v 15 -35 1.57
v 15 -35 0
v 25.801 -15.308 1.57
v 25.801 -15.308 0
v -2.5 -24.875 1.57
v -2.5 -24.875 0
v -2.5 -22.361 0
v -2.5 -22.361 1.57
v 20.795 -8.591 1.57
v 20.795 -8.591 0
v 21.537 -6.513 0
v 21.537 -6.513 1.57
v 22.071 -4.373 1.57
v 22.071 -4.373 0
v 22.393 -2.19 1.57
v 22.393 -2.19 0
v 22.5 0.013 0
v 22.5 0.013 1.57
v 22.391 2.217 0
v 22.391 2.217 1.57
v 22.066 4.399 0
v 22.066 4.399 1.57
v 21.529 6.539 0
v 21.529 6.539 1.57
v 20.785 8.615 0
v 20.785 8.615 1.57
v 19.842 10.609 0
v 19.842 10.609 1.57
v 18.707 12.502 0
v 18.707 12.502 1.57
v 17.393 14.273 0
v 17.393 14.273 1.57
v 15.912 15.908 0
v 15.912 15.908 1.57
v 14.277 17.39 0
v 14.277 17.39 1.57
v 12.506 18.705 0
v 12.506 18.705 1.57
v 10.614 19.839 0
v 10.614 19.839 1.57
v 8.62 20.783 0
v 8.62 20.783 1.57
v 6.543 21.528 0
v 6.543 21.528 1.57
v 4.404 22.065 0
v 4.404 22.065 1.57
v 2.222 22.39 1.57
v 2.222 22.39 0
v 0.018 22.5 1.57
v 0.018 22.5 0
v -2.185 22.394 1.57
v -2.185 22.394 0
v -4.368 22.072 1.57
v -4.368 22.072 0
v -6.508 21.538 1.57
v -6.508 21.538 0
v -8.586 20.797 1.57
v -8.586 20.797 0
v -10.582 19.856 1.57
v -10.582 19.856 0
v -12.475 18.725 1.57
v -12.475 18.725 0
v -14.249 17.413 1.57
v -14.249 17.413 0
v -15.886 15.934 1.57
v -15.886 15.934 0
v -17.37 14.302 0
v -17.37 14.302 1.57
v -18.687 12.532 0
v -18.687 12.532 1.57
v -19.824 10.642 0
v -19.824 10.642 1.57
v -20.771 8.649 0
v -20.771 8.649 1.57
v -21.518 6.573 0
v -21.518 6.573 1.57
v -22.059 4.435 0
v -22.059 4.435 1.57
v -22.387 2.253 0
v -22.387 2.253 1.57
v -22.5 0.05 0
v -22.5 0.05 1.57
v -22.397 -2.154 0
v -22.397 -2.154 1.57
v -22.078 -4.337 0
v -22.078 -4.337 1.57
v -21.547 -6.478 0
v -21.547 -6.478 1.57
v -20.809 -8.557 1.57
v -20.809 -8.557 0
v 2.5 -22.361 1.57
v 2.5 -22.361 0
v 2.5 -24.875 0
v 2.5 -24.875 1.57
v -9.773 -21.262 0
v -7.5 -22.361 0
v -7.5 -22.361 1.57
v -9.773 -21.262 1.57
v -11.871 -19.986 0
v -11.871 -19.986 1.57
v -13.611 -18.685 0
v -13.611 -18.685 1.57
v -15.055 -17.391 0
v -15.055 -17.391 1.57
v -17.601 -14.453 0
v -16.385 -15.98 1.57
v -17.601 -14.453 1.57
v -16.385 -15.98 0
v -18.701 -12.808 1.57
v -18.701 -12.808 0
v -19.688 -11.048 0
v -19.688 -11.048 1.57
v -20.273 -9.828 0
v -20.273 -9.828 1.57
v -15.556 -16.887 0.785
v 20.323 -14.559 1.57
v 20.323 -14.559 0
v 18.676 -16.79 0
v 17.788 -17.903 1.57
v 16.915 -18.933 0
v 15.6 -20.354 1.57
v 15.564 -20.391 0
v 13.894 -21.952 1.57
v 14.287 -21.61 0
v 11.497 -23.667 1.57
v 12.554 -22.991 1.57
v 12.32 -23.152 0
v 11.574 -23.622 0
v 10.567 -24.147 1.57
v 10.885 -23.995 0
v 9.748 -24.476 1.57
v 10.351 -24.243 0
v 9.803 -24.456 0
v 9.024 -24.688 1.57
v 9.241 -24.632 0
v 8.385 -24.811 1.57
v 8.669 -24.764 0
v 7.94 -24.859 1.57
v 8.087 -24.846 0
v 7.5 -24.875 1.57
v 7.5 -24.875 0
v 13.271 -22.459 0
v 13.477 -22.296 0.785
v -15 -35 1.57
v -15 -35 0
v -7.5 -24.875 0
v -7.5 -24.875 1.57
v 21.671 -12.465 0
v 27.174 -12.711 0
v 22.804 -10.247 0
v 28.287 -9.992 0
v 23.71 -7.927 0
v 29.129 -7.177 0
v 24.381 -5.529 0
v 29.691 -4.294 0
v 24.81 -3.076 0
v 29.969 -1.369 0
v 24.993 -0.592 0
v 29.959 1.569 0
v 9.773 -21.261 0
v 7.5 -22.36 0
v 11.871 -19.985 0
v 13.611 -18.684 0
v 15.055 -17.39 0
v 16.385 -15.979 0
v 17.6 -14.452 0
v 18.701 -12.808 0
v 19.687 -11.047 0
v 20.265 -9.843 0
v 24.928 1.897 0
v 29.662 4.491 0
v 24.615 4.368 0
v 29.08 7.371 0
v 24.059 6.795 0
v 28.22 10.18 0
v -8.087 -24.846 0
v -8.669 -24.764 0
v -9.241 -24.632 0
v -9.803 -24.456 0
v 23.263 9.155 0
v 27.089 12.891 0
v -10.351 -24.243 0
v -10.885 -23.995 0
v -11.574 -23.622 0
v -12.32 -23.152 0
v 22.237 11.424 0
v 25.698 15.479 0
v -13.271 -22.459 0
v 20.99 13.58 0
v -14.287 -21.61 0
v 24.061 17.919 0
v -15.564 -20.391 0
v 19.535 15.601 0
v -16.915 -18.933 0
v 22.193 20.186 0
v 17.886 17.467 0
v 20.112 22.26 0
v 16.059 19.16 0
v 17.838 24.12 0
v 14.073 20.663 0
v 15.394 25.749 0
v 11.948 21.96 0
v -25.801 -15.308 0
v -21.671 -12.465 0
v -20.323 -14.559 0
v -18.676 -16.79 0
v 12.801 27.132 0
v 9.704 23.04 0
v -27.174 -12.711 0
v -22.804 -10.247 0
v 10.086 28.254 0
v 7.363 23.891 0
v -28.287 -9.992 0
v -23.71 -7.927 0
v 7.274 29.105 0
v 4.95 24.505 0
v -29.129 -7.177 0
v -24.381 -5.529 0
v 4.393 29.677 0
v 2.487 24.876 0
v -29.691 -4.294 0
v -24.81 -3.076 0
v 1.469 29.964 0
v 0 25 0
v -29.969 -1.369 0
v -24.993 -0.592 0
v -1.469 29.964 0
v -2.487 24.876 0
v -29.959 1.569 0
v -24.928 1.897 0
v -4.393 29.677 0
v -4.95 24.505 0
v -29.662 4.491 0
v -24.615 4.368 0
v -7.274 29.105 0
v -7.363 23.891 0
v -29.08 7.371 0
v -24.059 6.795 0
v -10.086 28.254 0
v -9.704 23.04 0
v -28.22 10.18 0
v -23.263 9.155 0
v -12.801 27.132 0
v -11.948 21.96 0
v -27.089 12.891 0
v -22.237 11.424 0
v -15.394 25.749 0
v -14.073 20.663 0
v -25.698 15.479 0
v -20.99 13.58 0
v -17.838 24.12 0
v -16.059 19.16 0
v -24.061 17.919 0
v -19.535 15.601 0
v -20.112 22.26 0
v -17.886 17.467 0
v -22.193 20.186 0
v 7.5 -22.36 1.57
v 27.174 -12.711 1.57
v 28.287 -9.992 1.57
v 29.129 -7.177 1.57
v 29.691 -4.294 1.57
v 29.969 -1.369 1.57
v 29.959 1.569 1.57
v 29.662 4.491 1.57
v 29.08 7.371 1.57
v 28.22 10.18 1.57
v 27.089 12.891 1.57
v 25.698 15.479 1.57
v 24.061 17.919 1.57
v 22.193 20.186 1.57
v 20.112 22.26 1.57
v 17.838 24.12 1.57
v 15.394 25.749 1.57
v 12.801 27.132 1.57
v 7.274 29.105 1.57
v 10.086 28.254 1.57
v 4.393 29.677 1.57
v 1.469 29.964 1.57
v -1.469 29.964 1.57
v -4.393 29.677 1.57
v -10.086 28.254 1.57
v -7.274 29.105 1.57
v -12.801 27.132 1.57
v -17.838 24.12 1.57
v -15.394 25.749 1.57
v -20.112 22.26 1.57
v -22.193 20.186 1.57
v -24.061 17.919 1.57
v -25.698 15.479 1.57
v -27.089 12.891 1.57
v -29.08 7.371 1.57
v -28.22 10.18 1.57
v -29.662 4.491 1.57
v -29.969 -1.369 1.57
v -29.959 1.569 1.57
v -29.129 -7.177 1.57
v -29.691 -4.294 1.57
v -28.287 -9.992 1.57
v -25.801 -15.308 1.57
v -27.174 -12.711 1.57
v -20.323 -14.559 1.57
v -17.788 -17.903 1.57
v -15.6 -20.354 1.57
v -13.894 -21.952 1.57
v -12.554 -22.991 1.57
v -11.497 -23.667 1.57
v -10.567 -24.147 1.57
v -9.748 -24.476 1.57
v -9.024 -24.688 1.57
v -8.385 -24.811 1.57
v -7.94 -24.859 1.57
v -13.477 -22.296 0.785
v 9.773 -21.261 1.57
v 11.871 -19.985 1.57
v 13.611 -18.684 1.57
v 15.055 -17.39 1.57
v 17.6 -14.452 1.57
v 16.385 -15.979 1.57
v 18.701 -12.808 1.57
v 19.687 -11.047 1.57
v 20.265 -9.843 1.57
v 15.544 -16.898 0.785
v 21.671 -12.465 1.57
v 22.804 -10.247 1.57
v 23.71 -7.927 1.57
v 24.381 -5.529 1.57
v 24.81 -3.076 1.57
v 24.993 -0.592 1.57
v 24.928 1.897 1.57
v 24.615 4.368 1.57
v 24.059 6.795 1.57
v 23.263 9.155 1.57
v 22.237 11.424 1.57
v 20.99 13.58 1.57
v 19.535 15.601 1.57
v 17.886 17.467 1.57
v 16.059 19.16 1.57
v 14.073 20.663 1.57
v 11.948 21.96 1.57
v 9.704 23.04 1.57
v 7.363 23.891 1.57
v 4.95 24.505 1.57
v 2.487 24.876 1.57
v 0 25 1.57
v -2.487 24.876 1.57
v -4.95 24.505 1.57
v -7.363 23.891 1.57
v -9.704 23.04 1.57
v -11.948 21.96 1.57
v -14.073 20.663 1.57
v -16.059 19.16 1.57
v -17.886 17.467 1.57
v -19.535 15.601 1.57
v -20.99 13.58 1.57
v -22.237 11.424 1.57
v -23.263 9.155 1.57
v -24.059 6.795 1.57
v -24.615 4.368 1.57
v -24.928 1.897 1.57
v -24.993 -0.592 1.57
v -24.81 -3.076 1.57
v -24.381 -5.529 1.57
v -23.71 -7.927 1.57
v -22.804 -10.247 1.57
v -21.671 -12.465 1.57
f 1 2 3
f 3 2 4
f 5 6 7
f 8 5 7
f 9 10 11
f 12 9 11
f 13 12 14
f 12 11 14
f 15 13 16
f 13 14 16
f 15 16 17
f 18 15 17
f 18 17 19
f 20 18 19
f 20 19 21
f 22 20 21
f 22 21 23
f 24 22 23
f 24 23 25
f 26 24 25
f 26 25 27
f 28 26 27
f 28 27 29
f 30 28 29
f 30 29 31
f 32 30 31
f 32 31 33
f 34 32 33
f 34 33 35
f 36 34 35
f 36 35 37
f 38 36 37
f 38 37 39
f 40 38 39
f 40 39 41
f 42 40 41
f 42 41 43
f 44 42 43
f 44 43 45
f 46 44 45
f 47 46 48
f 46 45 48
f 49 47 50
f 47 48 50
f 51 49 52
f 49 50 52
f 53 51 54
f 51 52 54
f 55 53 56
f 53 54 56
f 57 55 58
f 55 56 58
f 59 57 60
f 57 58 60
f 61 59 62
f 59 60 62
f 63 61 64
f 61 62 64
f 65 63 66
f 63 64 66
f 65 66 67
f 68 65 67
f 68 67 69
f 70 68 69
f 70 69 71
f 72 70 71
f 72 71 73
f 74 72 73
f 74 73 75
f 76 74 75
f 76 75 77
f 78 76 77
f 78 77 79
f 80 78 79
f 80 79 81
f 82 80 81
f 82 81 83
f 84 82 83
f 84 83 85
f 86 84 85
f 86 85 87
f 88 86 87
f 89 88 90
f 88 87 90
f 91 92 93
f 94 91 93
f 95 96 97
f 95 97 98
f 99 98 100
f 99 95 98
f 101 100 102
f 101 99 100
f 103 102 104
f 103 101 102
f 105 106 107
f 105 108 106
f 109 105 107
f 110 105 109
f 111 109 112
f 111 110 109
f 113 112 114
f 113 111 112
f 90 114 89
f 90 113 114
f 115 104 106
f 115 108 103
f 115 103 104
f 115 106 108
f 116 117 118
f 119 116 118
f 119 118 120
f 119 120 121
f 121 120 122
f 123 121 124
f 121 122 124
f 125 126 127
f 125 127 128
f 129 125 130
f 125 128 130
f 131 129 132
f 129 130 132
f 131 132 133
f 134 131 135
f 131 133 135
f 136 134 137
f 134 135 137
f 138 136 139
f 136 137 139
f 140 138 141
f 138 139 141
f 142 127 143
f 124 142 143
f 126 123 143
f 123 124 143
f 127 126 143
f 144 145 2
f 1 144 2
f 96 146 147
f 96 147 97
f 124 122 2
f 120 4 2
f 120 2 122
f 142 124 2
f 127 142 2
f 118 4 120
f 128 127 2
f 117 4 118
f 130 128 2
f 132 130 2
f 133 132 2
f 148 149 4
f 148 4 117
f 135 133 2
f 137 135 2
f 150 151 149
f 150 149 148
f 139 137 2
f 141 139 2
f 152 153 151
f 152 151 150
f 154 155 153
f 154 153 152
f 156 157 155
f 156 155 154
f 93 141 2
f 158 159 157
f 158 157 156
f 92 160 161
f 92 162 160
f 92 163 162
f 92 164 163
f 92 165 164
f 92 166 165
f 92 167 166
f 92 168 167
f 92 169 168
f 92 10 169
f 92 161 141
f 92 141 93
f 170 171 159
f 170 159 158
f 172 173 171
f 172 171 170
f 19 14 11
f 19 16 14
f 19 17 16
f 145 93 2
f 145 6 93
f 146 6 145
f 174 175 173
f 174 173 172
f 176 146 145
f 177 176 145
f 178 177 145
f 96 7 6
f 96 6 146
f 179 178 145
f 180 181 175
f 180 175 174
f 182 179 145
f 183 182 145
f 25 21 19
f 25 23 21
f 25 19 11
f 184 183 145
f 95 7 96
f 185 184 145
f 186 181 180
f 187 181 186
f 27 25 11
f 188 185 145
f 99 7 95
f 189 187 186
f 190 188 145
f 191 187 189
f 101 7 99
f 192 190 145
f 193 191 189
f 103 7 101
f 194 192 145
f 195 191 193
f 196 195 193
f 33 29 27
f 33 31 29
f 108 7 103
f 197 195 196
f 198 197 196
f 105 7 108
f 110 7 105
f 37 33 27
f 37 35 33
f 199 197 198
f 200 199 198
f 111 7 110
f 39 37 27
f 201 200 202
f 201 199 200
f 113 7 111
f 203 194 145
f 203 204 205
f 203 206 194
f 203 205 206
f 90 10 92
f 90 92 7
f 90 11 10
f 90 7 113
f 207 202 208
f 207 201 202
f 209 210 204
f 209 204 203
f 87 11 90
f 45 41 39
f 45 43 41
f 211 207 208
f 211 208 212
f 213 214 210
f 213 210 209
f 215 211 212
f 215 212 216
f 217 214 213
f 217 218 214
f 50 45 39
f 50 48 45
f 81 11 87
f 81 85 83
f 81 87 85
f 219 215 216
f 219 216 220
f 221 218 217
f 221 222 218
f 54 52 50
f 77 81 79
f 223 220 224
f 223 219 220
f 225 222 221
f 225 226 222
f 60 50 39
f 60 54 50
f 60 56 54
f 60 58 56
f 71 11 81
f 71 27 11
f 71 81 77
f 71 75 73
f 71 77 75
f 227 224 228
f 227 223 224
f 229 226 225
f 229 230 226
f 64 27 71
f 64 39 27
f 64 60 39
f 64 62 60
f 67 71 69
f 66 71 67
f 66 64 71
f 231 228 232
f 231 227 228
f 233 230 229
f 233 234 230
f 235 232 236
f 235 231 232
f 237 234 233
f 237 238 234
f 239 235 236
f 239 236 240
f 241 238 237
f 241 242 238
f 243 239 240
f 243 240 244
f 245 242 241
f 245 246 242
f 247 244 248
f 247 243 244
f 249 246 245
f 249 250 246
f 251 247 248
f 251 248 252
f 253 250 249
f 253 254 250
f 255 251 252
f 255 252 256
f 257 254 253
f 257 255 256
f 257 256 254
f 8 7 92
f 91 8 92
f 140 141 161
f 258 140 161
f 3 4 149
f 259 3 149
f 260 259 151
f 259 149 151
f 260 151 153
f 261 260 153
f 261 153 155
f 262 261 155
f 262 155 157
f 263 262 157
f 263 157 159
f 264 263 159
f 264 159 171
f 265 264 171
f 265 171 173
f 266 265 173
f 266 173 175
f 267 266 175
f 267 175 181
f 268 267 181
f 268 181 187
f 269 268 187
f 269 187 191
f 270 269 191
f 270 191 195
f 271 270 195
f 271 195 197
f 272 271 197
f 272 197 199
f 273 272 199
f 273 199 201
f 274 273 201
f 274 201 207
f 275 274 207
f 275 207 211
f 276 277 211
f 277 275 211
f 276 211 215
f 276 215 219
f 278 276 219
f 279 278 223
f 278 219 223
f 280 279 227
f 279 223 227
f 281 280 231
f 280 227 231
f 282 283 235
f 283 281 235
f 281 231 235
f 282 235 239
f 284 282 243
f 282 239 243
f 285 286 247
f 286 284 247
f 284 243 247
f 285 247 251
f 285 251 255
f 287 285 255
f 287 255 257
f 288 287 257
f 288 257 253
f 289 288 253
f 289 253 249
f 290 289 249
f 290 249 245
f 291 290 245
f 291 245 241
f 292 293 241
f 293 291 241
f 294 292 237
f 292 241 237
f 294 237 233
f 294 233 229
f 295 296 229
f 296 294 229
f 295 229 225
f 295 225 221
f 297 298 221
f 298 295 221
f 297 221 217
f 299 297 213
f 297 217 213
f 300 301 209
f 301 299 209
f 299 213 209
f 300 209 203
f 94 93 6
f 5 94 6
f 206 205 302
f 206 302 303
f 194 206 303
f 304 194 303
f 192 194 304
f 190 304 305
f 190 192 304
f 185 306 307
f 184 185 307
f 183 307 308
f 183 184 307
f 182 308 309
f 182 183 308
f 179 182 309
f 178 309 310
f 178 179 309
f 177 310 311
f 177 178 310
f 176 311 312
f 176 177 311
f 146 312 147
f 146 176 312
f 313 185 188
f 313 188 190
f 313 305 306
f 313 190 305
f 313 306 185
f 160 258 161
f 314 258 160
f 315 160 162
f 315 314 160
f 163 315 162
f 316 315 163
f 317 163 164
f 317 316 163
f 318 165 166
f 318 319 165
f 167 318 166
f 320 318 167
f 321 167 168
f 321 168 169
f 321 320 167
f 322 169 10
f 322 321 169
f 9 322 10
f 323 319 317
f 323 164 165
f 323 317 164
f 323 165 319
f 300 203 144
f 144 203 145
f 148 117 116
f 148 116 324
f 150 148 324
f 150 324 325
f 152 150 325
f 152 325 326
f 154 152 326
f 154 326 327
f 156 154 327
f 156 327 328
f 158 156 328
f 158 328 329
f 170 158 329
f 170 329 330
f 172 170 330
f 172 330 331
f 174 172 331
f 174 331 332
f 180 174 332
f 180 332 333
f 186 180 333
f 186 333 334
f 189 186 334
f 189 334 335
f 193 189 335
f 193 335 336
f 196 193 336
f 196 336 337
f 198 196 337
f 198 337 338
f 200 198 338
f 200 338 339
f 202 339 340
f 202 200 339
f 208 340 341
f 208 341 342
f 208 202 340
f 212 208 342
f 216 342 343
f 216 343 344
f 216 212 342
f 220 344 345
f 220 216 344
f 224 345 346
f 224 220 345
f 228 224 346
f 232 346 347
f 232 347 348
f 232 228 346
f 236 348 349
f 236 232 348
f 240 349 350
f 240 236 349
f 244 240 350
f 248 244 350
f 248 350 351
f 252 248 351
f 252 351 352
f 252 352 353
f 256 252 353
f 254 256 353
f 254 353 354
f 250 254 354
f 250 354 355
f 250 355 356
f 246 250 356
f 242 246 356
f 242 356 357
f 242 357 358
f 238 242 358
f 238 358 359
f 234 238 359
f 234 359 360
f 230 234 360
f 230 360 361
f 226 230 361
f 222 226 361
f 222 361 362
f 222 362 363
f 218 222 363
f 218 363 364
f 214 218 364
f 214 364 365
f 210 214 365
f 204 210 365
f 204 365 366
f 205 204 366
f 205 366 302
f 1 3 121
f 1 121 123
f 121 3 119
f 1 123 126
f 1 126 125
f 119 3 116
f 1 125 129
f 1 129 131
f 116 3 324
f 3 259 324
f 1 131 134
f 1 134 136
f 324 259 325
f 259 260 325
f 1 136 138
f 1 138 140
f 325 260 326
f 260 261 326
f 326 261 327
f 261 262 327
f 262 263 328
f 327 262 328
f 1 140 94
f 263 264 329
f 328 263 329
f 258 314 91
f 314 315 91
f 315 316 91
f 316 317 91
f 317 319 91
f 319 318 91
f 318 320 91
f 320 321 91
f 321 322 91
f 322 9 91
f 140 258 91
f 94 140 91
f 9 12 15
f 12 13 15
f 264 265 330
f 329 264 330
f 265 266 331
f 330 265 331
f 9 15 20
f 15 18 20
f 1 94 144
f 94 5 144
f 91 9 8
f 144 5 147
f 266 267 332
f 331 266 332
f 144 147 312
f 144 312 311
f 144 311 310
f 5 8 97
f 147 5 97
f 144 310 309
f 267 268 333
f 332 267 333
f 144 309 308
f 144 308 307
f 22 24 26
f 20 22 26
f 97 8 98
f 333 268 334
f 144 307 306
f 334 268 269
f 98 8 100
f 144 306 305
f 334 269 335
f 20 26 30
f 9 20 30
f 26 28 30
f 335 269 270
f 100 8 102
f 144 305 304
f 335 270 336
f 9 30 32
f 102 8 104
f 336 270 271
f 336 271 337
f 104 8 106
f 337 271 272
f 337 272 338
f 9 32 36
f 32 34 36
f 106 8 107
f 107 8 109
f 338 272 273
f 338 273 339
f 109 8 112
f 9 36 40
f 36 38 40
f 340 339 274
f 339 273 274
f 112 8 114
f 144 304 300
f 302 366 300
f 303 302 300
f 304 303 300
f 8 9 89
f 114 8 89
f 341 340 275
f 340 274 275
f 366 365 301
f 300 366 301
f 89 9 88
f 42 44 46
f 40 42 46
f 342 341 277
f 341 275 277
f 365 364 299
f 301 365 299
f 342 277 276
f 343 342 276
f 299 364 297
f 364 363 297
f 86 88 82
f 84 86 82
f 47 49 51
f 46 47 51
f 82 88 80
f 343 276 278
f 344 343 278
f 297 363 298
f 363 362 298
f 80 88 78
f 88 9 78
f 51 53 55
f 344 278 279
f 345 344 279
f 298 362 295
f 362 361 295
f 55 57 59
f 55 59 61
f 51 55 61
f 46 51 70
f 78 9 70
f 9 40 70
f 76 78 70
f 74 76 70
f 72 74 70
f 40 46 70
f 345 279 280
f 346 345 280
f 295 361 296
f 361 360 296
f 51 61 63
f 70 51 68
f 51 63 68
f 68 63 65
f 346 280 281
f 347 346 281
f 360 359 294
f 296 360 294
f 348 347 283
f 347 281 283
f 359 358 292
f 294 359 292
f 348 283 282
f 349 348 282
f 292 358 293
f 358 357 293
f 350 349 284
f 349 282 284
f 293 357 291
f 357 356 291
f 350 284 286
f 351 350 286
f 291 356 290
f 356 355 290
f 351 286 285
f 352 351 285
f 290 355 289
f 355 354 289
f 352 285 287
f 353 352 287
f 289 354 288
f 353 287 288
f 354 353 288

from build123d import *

# Parameters (mm, degrees)
ESBO_O1_R           = 30
ESBO_O1_R_2         = 25
BOSS_EXTRUDE1_DEPTH = 1.57
BOSS_EXTRUDE2_START = -1.57
BOSS_EXTRUDE2_DEPTH = 1.57
BOSS_EXTRUDE3_DEPTH = 1.57
BOSS_EXTRUDE4_START = -1.57
SKETCH4_R           = 22.5
BOSS_EXTRUDE4_DEPTH = 1.57
BOSS_EXTRUDE5_START = -1.57
BOSS_EXTRUDE5_DEPTH = 1.57
CUT_EXTRUDE1_START  = -1.57
CUT_EXTRUDE1_DEPTH  = 1.57
CUT_EXTRUDE2_START  = -10
CUT_EXTRUDE2_DEPTH  = 10
EXTRUDE_THIN2_START = -1.57
EXTRUDE_THIN2_DEPTH = 1.57
BOSS_EXTRUDE9_DEPTH = 1.57


# Read off the part's stored shape, not the designer's step: Extrude-Thin2
with BuildPart() as part:
    # Esboço1 → Boss-Extrude1 (new body)
    with BuildSketch(Plane.XY):
        Circle(ESBO_O1_R)
        Circle(ESBO_O1_R_2, mode=Mode.SUBTRACT)
    extrude(amount=BOSS_EXTRUDE1_DEPTH)

    # Sketch1 → Boss-Extrude2 (add)
    with BuildSketch(Plane.XY.offset(1.57).offset(BOSS_EXTRUDE2_START)):
        with BuildLine():
            Line((-25.800536663, -15.307916512), (-15, -35))
            Line((-15, -35), (-15, -25.980762114))
            ThreePointArc((-15, -25.980762114), (-21.086686707, -21.338970071), (-25.800536663, -15.307916512))
        make_face()
        with BuildLine():
            Line((-15, -35), (0, -35))
            Line((0, -35), (0, -30))
            ThreePointArc((0, -30), (-7.764571353, -28.977774789), (-15, -25.980762114))
            Line((-15, -25.980762114), (-15, -35))
        make_face()
        with BuildLine():
            Line((0, -35), (15, -35))
            Line((15, -35), (15, -25.980762114))
            ThreePointArc((15, -25.980762114), (7.764571353, -28.977774789), (0, -30))
            Line((0, -30), (0, -35))
        make_face()
        with BuildLine():
            Line((15, -25.980762114), (15, -35))
            Line((15, -35), (25.800536663, -15.307916512))
            ThreePointArc((25.800536663, -15.307916512), (21.086686707, -21.338970071), (15, -25.980762114))
        make_face()
    extrude(amount=BOSS_EXTRUDE2_DEPTH)

    # Sketch2 → Boss-Extrude3 (add)
    with BuildSketch(Plane.XY):
        with BuildLine():
            Line((-2.5, -25), (-2.5, -22.360679775))
            ThreePointArc((-2.5, -22.360679775), (-5.0328099, -21.929907079), (-7.5, -21.213203436))
            Line((-7.5, -21.213203436), (-7.5, -25))
            Line((-7.5, -25), (-2.5, -25))
        make_face()
        with BuildLine():
            ThreePointArc((7.5, -21.213203436), (5.0328099, -21.929907079), (2.5, -22.360679775))
            Line((2.5, -22.360679775), (2.5, -25))
            Line((2.5, -25), (7.5, -25))
            Line((7.5, -25), (7.5, -21.213203436))
        make_face()
    extrude(amount=BOSS_EXTRUDE3_DEPTH)

    # Sketch4 → Boss-Extrude4 (add)
    with BuildSketch(Plane.XY.offset(1.57).offset(BOSS_EXTRUDE4_START)):
        Circle(SKETCH4_R)
    extrude(amount=BOSS_EXTRUDE4_DEPTH)

    # Sketch5 → Boss-Extrude5 (add)
    with BuildSketch(Plane.XY.offset(1.57).offset(BOSS_EXTRUDE5_START)):
        with BuildLine():
            Line((2.5, -24.874685928), (-2.5, -24.874685928))
            ThreePointArc((-2.5, -24.874685928), (0, -25), (2.5, -24.874685928))
        make_face()
    extrude(amount=BOSS_EXTRUDE5_DEPTH)

    # Sketch6 → Cut-Extrude1 (cut)
    with BuildSketch(Plane.XY.offset(1.57).offset(CUT_EXTRUDE1_START)):
        with BuildLine():
            Line((-2.5, -22.360679775), (2.5, -22.360679775))
            ThreePointArc((2.5, -22.360679775), (0, -22.5), (-2.5, -22.360679775))
        make_face()
    extrude(amount=CUT_EXTRUDE1_DEPTH, mode=Mode.SUBTRACT)

    # Sketch7 → Cut-Extrude2 (cut)
    with BuildSketch(Plane.XY.offset(1.57).offset(CUT_EXTRUDE2_START)):
        with BuildLine():
            add(Edge.make_bspline(
                [(-20.323456945, -14.558746437), (-13.043190103, -24.874685928), (-7.5, -24.874685928)],
                knots=[0, 0, 0, 1, 1, 1], degree=2))
            Line((-7.5, -24.874685928), (-7.5, -23.848480035))
            ThreePointArc((-7.5, -23.848480035), (-14.666662084, -20.245716172), (-20.323456945, -14.558746437))
        make_face()
        with BuildLine():
            add(Edge.make_bspline(
                [(20.323456945, -14.558746437), (13.043190103, -24.874685928), (7.5, -24.874685928)],
                knots=[0, 0, 0, 1, 1, 1], degree=2))
            ThreePointArc((20.323456945, -14.558746437), (14.666662084, -20.245716172), (7.5, -23.848480035))
            Line((7.5, -23.848480035), (7.5, -24.874685928))
        make_face()
    extrude(amount=CUT_EXTRUDE2_DEPTH, mode=Mode.SUBTRACT)

    # Extrude-Thin2 outline → Extrude-Thin2 (add)
    with BuildSketch(Plane.XY.offset(1.57).offset(EXTRUDE_THIN2_START)):
        with BuildLine():
            add(Edge.make_bspline(
                [(-7.5, -22.360679775), (-16.957974034, -18.314631092), (-20.809324876, -8.556985344)],
                knots=[0, 0, 0, 0.902799725, 0.902799725, 0.902799725], degree=2))
            Line((-7.5, -22.360679775), (-7.5, -21.213203436))
            ThreePointArc((-7.5, -21.213203436), (-15.504819665, -16.30492463), (-20.809324876, -8.556985344))
        make_face()
    extrude(amount=EXTRUDE_THIN2_DEPTH)

    # Sketch10 → Boss-Extrude9 (add)
    with BuildSketch(Plane.XY.offset(1.57)):
        with BuildLine():
            Line((2.499590074, -22.36028679), (2.499590074, -20.208780459))
            Line((2.499590074, -20.208780459), (21.573238209, -6.389263197))
            add(Edge.make_bspline(
                [(7.499590074, -22.36028679), (17.975860478, -17.878618737), (21.573238209, -6.389263197)],
                knots=[0, 0, 0, 1, 1, 1], degree=2))
            Line((7.499590074, -22.36028679), (2.499590074, -22.36028679))
        make_face()
    extrude(amount=-BOSS_EXTRUDE9_DEPTH)


solid = part.part
